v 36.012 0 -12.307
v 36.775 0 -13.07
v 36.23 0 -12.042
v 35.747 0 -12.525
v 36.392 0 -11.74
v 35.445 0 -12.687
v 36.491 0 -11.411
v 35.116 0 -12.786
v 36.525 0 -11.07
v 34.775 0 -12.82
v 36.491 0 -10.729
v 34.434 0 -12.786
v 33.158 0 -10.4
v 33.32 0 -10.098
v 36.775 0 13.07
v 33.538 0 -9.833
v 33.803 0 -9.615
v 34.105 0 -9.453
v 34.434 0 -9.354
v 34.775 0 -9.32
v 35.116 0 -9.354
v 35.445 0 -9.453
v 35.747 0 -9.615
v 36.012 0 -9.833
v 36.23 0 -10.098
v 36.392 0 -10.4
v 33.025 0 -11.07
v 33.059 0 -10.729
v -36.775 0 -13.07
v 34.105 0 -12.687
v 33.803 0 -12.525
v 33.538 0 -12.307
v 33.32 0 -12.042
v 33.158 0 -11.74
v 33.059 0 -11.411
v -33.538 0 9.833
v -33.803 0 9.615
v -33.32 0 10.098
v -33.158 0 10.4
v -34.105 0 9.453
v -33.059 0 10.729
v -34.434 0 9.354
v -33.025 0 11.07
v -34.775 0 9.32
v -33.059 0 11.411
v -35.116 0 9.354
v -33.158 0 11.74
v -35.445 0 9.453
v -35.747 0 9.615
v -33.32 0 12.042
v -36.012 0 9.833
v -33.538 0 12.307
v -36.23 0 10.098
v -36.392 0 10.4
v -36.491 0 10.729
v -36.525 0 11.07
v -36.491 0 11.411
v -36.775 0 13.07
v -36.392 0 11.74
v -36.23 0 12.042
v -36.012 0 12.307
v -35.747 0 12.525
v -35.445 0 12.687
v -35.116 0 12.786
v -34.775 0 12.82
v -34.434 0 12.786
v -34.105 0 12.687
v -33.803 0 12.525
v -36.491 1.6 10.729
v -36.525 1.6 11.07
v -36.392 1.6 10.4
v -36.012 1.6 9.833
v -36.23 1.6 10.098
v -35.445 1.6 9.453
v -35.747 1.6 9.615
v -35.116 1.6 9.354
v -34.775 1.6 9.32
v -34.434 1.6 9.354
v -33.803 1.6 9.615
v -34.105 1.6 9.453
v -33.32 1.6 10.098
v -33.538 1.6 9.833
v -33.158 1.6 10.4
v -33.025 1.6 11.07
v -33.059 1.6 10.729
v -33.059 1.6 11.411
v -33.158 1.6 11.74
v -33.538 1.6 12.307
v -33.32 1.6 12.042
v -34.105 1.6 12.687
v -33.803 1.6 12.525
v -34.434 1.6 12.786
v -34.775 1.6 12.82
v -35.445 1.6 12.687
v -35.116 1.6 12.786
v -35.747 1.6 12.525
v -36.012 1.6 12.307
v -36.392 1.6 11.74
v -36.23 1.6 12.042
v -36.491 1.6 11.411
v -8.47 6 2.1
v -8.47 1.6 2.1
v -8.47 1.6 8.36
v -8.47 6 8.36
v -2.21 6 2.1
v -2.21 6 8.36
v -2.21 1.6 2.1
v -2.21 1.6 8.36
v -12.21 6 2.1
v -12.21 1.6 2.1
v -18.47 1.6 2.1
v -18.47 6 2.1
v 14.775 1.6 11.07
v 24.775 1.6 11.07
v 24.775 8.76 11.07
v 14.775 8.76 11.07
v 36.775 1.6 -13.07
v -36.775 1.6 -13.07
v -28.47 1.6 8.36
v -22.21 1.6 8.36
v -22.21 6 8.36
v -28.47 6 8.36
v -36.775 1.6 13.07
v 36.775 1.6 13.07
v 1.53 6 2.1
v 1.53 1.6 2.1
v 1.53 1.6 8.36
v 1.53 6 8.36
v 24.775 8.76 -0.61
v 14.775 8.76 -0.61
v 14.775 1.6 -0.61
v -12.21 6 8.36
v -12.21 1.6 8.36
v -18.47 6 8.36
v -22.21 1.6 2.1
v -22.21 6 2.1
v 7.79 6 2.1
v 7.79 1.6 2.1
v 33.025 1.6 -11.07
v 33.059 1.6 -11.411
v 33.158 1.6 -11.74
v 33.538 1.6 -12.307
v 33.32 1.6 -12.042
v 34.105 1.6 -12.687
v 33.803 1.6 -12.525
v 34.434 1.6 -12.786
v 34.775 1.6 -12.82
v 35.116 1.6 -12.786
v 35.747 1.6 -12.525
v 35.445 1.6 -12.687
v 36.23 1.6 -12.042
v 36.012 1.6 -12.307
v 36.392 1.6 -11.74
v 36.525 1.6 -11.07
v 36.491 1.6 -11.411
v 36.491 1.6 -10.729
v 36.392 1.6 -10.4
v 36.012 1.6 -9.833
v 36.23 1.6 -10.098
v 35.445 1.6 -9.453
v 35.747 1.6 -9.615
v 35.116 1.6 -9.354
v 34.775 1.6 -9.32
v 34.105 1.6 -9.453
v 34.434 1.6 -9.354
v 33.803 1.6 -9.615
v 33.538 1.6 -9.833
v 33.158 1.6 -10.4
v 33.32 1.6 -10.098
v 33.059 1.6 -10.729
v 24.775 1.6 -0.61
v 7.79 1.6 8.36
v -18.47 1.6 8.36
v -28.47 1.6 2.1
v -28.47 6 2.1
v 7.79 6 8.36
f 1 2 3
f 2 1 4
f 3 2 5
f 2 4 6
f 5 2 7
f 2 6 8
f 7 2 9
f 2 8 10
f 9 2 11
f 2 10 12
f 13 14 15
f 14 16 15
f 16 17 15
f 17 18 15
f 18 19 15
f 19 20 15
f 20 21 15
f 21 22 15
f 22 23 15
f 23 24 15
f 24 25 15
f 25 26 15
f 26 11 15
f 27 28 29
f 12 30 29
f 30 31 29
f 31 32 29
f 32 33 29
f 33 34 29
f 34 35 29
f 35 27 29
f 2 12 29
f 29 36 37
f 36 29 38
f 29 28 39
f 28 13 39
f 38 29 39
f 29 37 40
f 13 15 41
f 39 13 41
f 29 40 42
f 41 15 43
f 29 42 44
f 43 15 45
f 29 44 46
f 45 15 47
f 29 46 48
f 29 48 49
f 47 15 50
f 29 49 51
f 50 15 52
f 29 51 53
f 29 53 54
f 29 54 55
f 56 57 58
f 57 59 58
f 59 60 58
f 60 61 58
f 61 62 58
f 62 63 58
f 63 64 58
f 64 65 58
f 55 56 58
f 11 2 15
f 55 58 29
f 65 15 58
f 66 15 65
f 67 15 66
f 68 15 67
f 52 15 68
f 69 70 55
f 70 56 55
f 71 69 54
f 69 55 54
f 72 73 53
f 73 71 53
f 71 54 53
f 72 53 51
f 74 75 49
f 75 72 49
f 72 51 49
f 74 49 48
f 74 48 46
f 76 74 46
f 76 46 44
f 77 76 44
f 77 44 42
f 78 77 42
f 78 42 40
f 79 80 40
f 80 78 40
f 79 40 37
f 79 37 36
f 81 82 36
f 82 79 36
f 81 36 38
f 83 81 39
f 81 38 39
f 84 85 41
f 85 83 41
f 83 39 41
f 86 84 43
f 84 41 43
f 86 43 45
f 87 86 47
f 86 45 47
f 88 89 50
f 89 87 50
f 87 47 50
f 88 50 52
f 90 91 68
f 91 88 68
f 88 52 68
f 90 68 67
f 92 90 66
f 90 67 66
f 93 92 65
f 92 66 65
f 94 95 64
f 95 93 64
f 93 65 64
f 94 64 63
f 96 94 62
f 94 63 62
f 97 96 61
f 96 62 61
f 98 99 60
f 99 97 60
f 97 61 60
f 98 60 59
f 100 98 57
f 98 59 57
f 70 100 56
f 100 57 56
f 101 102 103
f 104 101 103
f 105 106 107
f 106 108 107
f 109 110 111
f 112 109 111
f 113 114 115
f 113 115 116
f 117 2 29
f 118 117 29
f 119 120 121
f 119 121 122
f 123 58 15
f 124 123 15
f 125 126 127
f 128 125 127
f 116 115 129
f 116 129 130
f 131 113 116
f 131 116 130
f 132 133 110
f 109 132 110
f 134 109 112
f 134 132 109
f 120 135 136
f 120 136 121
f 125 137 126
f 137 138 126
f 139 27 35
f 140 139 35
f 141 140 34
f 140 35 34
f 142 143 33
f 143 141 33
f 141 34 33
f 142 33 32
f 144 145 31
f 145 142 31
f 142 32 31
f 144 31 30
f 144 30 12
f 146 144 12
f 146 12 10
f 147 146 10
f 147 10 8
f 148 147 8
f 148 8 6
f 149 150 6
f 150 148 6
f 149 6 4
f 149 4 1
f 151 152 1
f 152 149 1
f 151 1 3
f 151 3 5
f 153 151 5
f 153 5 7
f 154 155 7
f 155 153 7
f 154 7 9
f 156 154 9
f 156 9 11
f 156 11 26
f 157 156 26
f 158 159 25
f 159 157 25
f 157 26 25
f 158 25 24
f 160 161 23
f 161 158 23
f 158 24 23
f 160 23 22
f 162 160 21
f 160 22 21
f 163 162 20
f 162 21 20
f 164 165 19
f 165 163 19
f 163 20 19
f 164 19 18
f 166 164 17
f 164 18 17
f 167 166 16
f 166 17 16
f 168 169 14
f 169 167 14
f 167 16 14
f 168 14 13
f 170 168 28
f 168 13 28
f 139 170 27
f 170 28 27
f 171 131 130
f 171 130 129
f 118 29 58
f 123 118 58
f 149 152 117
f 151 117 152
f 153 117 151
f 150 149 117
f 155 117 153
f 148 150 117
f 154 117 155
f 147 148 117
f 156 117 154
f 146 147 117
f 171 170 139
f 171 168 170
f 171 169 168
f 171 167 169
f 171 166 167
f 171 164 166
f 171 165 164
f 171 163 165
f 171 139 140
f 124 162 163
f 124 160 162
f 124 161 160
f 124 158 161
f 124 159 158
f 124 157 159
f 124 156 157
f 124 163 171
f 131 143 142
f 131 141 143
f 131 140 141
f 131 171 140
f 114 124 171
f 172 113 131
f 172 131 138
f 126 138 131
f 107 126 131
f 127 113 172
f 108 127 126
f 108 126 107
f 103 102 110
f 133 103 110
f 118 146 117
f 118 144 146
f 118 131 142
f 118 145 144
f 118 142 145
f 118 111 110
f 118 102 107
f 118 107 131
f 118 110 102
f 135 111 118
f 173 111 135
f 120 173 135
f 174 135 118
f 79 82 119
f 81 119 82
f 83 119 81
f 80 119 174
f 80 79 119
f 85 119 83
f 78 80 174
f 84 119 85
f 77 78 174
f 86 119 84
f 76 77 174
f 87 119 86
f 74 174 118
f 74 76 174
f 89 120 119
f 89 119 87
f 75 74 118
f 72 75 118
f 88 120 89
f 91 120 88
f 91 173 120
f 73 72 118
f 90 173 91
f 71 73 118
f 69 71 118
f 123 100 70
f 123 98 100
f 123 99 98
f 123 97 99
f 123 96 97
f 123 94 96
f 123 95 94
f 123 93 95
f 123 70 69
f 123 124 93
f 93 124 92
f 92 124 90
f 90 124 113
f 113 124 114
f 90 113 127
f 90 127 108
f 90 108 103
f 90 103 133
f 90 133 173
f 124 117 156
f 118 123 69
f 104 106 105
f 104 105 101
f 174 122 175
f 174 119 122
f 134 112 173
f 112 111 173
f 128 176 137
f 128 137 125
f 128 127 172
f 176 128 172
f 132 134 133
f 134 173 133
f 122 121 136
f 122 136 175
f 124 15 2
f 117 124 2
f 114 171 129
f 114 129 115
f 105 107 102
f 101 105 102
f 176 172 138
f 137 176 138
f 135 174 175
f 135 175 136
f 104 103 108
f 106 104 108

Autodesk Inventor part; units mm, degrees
ref_plane "YZ Plane" through (0, 0, 0) normal (1, 0, 0) x (0, 1, 0)
ref_plane "XZ Plane" through (0, 0, 0) normal (0, 1, 0) x (-1, 0, 0)
ref_plane "XY Plane" through (0, 0, 0) normal (0, 0, 1) x (1, 0, 0)
sketch "Sketch1" plane through (0, 0, 0) normal (0, 1, 0) x (-1, 0, 0)
  line L0 (36.775, 13.07) -> (-36.775, 13.07)
  line L1 (-36.775, 13.07) -> (-36.775, -13.07)
  line L2 (-36.775, -13.07) -> (36.775, -13.07)
  line L3 (36.775, -13.07) -> (36.775, 13.07)
  line L4 (36.775, 13.07) -> (-36.775, -13.07) construction
  line L5 (-36.775, 13.07) -> (36.775, -13.07) construction
  circle A0 centre (-34.775, -11.07) radius 1.75
  circle A1 centre (34.775, 11.07) radius 1.75
  line L6 (-14.775, -0.61) -> (-24.775, -0.61)
  line L7 (-24.775, -0.61) -> (-24.775, 11.07)
  line L8 (-24.775, 11.07) -> (-14.775, 11.07)
  line L9 (-14.775, 11.07) -> (-14.775, -0.61)
  line L10 (-14.775, -0.61) -> (-24.775, 11.07) construction
  line L11 (-24.775, -0.61) -> (-14.775, 11.07) construction
  line L12 (28.4695, 2.1) -> (22.2095, 2.1)
  line L13 (22.2095, 2.1) -> (22.2095, 8.36)
  line L14 (22.2095, 8.36) -> (28.4695, 8.36)
  line L15 (28.4695, 8.36) -> (28.4695, 2.1)
  line L16 (28.4695, 2.1) -> (22.2095, 8.36) construction
  line L17 (22.2095, 2.1) -> (28.4695, 8.36) construction
  line L18 (18.4695, 8.36) -> (12.2095, 8.36)
  line L19 (12.2095, 8.36) -> (12.2095, 2.1)
  line L20 (12.2095, 2.1) -> (18.4695, 2.1)
  line L21 (18.4695, 2.1) -> (18.4695, 8.36)
  line L22 (18.4695, 8.36) -> (12.2095, 2.1) construction
  line L23 (12.2095, 8.36) -> (18.4695, 2.1) construction
  line L24 (8.4695, 8.36) -> (2.2095, 8.36)
  line L25 (2.2095, 8.36) -> (2.2095, 2.1)
  line L26 (2.2095, 2.1) -> (8.4695, 2.1)
  line L27 (8.4695, 2.1) -> (8.4695, 8.36)
  line L28 (8.4695, 8.36) -> (2.2095, 2.1) construction
  line L29 (2.2095, 8.36) -> (8.4695, 2.1) construction
  line L30 (-1.5305, 8.36) -> (-7.7905, 8.36)
  line L31 (-7.7905, 8.36) -> (-7.7905, 2.1)
  line L32 (-7.7905, 2.1) -> (-1.5305, 2.1)
  line L33 (-1.5305, 2.1) -> (-1.5305, 8.36)
  line L34 (-1.5305, 8.36) -> (-7.7905, 2.1) construction
  line L35 (-7.7905, 8.36) -> (-1.5305, 2.1) construction
  point P0 (0, 0)
  point P1 (-19.775, 5.23)
  point P2 (25.3395, 5.23)
  point P3 (15.3395, 5.23)
  point P4 (5.3395, 5.23)
  point P5 (-4.6605, 5.23)
  dimension "d0" = 73.55
  dimension "d1" = 26.14
  dimension "d2" = 3.5
  dimension "d3" = 2
  dimension "d4" = 2
  dimension "d5" = 3.5
  dimension "d6" = 2
  dimension "d7" = 2
  dimension "d8" = 10
  dimension "d9" = 11.68
  dimension "d10" = 12
  dimension "d11" = 2
  dimension "d12" = 6.26
  dimension "d13" = 6.26
  dimension "d14" = 6.26
  dimension "d15" = 6.26
  dimension "d16" = 10
  dimension "d17" = 6.26
  dimension "d18" = 6.26
  dimension "d19" = 10
  dimension "d20" = 6.26
  dimension "d21" = 6.26
  dimension "d22" = 10
  dimension "d23" = 6.9845
extrude "Extrusion1" add sketch "Sketch1" along normal blind 1.6
extrude "Extrusion2" add sketch "Sketch1" along normal blind 8.76 contours L6 L7 L8 L9
extrude "Extrusion3" add sketch "Sketch1" along normal blind 6 contours L12 L13 L14 L15 | L21 L20 L19 L18 | L27 L26 L25 L24 | L33 L32 L31 L30
sketch "Sketch2" plane through (0, 1.6, 0) normal (0, 1, 0) x (1, 0, 0)
  line L0 (-31.8499, 8.687) -> (29.6525, 8.687) construction
  line L1 (29.6525, 8.687) -> (29.6525, 4.9573) construction
  line L2 (29.6525, 4.9573) -> (-31.8499, 4.9573) construction
  line L3 (-31.8499, 4.9573) -> (-31.8499, 8.687) construction
  point P0 (0, 0)
properties part number "mode"
